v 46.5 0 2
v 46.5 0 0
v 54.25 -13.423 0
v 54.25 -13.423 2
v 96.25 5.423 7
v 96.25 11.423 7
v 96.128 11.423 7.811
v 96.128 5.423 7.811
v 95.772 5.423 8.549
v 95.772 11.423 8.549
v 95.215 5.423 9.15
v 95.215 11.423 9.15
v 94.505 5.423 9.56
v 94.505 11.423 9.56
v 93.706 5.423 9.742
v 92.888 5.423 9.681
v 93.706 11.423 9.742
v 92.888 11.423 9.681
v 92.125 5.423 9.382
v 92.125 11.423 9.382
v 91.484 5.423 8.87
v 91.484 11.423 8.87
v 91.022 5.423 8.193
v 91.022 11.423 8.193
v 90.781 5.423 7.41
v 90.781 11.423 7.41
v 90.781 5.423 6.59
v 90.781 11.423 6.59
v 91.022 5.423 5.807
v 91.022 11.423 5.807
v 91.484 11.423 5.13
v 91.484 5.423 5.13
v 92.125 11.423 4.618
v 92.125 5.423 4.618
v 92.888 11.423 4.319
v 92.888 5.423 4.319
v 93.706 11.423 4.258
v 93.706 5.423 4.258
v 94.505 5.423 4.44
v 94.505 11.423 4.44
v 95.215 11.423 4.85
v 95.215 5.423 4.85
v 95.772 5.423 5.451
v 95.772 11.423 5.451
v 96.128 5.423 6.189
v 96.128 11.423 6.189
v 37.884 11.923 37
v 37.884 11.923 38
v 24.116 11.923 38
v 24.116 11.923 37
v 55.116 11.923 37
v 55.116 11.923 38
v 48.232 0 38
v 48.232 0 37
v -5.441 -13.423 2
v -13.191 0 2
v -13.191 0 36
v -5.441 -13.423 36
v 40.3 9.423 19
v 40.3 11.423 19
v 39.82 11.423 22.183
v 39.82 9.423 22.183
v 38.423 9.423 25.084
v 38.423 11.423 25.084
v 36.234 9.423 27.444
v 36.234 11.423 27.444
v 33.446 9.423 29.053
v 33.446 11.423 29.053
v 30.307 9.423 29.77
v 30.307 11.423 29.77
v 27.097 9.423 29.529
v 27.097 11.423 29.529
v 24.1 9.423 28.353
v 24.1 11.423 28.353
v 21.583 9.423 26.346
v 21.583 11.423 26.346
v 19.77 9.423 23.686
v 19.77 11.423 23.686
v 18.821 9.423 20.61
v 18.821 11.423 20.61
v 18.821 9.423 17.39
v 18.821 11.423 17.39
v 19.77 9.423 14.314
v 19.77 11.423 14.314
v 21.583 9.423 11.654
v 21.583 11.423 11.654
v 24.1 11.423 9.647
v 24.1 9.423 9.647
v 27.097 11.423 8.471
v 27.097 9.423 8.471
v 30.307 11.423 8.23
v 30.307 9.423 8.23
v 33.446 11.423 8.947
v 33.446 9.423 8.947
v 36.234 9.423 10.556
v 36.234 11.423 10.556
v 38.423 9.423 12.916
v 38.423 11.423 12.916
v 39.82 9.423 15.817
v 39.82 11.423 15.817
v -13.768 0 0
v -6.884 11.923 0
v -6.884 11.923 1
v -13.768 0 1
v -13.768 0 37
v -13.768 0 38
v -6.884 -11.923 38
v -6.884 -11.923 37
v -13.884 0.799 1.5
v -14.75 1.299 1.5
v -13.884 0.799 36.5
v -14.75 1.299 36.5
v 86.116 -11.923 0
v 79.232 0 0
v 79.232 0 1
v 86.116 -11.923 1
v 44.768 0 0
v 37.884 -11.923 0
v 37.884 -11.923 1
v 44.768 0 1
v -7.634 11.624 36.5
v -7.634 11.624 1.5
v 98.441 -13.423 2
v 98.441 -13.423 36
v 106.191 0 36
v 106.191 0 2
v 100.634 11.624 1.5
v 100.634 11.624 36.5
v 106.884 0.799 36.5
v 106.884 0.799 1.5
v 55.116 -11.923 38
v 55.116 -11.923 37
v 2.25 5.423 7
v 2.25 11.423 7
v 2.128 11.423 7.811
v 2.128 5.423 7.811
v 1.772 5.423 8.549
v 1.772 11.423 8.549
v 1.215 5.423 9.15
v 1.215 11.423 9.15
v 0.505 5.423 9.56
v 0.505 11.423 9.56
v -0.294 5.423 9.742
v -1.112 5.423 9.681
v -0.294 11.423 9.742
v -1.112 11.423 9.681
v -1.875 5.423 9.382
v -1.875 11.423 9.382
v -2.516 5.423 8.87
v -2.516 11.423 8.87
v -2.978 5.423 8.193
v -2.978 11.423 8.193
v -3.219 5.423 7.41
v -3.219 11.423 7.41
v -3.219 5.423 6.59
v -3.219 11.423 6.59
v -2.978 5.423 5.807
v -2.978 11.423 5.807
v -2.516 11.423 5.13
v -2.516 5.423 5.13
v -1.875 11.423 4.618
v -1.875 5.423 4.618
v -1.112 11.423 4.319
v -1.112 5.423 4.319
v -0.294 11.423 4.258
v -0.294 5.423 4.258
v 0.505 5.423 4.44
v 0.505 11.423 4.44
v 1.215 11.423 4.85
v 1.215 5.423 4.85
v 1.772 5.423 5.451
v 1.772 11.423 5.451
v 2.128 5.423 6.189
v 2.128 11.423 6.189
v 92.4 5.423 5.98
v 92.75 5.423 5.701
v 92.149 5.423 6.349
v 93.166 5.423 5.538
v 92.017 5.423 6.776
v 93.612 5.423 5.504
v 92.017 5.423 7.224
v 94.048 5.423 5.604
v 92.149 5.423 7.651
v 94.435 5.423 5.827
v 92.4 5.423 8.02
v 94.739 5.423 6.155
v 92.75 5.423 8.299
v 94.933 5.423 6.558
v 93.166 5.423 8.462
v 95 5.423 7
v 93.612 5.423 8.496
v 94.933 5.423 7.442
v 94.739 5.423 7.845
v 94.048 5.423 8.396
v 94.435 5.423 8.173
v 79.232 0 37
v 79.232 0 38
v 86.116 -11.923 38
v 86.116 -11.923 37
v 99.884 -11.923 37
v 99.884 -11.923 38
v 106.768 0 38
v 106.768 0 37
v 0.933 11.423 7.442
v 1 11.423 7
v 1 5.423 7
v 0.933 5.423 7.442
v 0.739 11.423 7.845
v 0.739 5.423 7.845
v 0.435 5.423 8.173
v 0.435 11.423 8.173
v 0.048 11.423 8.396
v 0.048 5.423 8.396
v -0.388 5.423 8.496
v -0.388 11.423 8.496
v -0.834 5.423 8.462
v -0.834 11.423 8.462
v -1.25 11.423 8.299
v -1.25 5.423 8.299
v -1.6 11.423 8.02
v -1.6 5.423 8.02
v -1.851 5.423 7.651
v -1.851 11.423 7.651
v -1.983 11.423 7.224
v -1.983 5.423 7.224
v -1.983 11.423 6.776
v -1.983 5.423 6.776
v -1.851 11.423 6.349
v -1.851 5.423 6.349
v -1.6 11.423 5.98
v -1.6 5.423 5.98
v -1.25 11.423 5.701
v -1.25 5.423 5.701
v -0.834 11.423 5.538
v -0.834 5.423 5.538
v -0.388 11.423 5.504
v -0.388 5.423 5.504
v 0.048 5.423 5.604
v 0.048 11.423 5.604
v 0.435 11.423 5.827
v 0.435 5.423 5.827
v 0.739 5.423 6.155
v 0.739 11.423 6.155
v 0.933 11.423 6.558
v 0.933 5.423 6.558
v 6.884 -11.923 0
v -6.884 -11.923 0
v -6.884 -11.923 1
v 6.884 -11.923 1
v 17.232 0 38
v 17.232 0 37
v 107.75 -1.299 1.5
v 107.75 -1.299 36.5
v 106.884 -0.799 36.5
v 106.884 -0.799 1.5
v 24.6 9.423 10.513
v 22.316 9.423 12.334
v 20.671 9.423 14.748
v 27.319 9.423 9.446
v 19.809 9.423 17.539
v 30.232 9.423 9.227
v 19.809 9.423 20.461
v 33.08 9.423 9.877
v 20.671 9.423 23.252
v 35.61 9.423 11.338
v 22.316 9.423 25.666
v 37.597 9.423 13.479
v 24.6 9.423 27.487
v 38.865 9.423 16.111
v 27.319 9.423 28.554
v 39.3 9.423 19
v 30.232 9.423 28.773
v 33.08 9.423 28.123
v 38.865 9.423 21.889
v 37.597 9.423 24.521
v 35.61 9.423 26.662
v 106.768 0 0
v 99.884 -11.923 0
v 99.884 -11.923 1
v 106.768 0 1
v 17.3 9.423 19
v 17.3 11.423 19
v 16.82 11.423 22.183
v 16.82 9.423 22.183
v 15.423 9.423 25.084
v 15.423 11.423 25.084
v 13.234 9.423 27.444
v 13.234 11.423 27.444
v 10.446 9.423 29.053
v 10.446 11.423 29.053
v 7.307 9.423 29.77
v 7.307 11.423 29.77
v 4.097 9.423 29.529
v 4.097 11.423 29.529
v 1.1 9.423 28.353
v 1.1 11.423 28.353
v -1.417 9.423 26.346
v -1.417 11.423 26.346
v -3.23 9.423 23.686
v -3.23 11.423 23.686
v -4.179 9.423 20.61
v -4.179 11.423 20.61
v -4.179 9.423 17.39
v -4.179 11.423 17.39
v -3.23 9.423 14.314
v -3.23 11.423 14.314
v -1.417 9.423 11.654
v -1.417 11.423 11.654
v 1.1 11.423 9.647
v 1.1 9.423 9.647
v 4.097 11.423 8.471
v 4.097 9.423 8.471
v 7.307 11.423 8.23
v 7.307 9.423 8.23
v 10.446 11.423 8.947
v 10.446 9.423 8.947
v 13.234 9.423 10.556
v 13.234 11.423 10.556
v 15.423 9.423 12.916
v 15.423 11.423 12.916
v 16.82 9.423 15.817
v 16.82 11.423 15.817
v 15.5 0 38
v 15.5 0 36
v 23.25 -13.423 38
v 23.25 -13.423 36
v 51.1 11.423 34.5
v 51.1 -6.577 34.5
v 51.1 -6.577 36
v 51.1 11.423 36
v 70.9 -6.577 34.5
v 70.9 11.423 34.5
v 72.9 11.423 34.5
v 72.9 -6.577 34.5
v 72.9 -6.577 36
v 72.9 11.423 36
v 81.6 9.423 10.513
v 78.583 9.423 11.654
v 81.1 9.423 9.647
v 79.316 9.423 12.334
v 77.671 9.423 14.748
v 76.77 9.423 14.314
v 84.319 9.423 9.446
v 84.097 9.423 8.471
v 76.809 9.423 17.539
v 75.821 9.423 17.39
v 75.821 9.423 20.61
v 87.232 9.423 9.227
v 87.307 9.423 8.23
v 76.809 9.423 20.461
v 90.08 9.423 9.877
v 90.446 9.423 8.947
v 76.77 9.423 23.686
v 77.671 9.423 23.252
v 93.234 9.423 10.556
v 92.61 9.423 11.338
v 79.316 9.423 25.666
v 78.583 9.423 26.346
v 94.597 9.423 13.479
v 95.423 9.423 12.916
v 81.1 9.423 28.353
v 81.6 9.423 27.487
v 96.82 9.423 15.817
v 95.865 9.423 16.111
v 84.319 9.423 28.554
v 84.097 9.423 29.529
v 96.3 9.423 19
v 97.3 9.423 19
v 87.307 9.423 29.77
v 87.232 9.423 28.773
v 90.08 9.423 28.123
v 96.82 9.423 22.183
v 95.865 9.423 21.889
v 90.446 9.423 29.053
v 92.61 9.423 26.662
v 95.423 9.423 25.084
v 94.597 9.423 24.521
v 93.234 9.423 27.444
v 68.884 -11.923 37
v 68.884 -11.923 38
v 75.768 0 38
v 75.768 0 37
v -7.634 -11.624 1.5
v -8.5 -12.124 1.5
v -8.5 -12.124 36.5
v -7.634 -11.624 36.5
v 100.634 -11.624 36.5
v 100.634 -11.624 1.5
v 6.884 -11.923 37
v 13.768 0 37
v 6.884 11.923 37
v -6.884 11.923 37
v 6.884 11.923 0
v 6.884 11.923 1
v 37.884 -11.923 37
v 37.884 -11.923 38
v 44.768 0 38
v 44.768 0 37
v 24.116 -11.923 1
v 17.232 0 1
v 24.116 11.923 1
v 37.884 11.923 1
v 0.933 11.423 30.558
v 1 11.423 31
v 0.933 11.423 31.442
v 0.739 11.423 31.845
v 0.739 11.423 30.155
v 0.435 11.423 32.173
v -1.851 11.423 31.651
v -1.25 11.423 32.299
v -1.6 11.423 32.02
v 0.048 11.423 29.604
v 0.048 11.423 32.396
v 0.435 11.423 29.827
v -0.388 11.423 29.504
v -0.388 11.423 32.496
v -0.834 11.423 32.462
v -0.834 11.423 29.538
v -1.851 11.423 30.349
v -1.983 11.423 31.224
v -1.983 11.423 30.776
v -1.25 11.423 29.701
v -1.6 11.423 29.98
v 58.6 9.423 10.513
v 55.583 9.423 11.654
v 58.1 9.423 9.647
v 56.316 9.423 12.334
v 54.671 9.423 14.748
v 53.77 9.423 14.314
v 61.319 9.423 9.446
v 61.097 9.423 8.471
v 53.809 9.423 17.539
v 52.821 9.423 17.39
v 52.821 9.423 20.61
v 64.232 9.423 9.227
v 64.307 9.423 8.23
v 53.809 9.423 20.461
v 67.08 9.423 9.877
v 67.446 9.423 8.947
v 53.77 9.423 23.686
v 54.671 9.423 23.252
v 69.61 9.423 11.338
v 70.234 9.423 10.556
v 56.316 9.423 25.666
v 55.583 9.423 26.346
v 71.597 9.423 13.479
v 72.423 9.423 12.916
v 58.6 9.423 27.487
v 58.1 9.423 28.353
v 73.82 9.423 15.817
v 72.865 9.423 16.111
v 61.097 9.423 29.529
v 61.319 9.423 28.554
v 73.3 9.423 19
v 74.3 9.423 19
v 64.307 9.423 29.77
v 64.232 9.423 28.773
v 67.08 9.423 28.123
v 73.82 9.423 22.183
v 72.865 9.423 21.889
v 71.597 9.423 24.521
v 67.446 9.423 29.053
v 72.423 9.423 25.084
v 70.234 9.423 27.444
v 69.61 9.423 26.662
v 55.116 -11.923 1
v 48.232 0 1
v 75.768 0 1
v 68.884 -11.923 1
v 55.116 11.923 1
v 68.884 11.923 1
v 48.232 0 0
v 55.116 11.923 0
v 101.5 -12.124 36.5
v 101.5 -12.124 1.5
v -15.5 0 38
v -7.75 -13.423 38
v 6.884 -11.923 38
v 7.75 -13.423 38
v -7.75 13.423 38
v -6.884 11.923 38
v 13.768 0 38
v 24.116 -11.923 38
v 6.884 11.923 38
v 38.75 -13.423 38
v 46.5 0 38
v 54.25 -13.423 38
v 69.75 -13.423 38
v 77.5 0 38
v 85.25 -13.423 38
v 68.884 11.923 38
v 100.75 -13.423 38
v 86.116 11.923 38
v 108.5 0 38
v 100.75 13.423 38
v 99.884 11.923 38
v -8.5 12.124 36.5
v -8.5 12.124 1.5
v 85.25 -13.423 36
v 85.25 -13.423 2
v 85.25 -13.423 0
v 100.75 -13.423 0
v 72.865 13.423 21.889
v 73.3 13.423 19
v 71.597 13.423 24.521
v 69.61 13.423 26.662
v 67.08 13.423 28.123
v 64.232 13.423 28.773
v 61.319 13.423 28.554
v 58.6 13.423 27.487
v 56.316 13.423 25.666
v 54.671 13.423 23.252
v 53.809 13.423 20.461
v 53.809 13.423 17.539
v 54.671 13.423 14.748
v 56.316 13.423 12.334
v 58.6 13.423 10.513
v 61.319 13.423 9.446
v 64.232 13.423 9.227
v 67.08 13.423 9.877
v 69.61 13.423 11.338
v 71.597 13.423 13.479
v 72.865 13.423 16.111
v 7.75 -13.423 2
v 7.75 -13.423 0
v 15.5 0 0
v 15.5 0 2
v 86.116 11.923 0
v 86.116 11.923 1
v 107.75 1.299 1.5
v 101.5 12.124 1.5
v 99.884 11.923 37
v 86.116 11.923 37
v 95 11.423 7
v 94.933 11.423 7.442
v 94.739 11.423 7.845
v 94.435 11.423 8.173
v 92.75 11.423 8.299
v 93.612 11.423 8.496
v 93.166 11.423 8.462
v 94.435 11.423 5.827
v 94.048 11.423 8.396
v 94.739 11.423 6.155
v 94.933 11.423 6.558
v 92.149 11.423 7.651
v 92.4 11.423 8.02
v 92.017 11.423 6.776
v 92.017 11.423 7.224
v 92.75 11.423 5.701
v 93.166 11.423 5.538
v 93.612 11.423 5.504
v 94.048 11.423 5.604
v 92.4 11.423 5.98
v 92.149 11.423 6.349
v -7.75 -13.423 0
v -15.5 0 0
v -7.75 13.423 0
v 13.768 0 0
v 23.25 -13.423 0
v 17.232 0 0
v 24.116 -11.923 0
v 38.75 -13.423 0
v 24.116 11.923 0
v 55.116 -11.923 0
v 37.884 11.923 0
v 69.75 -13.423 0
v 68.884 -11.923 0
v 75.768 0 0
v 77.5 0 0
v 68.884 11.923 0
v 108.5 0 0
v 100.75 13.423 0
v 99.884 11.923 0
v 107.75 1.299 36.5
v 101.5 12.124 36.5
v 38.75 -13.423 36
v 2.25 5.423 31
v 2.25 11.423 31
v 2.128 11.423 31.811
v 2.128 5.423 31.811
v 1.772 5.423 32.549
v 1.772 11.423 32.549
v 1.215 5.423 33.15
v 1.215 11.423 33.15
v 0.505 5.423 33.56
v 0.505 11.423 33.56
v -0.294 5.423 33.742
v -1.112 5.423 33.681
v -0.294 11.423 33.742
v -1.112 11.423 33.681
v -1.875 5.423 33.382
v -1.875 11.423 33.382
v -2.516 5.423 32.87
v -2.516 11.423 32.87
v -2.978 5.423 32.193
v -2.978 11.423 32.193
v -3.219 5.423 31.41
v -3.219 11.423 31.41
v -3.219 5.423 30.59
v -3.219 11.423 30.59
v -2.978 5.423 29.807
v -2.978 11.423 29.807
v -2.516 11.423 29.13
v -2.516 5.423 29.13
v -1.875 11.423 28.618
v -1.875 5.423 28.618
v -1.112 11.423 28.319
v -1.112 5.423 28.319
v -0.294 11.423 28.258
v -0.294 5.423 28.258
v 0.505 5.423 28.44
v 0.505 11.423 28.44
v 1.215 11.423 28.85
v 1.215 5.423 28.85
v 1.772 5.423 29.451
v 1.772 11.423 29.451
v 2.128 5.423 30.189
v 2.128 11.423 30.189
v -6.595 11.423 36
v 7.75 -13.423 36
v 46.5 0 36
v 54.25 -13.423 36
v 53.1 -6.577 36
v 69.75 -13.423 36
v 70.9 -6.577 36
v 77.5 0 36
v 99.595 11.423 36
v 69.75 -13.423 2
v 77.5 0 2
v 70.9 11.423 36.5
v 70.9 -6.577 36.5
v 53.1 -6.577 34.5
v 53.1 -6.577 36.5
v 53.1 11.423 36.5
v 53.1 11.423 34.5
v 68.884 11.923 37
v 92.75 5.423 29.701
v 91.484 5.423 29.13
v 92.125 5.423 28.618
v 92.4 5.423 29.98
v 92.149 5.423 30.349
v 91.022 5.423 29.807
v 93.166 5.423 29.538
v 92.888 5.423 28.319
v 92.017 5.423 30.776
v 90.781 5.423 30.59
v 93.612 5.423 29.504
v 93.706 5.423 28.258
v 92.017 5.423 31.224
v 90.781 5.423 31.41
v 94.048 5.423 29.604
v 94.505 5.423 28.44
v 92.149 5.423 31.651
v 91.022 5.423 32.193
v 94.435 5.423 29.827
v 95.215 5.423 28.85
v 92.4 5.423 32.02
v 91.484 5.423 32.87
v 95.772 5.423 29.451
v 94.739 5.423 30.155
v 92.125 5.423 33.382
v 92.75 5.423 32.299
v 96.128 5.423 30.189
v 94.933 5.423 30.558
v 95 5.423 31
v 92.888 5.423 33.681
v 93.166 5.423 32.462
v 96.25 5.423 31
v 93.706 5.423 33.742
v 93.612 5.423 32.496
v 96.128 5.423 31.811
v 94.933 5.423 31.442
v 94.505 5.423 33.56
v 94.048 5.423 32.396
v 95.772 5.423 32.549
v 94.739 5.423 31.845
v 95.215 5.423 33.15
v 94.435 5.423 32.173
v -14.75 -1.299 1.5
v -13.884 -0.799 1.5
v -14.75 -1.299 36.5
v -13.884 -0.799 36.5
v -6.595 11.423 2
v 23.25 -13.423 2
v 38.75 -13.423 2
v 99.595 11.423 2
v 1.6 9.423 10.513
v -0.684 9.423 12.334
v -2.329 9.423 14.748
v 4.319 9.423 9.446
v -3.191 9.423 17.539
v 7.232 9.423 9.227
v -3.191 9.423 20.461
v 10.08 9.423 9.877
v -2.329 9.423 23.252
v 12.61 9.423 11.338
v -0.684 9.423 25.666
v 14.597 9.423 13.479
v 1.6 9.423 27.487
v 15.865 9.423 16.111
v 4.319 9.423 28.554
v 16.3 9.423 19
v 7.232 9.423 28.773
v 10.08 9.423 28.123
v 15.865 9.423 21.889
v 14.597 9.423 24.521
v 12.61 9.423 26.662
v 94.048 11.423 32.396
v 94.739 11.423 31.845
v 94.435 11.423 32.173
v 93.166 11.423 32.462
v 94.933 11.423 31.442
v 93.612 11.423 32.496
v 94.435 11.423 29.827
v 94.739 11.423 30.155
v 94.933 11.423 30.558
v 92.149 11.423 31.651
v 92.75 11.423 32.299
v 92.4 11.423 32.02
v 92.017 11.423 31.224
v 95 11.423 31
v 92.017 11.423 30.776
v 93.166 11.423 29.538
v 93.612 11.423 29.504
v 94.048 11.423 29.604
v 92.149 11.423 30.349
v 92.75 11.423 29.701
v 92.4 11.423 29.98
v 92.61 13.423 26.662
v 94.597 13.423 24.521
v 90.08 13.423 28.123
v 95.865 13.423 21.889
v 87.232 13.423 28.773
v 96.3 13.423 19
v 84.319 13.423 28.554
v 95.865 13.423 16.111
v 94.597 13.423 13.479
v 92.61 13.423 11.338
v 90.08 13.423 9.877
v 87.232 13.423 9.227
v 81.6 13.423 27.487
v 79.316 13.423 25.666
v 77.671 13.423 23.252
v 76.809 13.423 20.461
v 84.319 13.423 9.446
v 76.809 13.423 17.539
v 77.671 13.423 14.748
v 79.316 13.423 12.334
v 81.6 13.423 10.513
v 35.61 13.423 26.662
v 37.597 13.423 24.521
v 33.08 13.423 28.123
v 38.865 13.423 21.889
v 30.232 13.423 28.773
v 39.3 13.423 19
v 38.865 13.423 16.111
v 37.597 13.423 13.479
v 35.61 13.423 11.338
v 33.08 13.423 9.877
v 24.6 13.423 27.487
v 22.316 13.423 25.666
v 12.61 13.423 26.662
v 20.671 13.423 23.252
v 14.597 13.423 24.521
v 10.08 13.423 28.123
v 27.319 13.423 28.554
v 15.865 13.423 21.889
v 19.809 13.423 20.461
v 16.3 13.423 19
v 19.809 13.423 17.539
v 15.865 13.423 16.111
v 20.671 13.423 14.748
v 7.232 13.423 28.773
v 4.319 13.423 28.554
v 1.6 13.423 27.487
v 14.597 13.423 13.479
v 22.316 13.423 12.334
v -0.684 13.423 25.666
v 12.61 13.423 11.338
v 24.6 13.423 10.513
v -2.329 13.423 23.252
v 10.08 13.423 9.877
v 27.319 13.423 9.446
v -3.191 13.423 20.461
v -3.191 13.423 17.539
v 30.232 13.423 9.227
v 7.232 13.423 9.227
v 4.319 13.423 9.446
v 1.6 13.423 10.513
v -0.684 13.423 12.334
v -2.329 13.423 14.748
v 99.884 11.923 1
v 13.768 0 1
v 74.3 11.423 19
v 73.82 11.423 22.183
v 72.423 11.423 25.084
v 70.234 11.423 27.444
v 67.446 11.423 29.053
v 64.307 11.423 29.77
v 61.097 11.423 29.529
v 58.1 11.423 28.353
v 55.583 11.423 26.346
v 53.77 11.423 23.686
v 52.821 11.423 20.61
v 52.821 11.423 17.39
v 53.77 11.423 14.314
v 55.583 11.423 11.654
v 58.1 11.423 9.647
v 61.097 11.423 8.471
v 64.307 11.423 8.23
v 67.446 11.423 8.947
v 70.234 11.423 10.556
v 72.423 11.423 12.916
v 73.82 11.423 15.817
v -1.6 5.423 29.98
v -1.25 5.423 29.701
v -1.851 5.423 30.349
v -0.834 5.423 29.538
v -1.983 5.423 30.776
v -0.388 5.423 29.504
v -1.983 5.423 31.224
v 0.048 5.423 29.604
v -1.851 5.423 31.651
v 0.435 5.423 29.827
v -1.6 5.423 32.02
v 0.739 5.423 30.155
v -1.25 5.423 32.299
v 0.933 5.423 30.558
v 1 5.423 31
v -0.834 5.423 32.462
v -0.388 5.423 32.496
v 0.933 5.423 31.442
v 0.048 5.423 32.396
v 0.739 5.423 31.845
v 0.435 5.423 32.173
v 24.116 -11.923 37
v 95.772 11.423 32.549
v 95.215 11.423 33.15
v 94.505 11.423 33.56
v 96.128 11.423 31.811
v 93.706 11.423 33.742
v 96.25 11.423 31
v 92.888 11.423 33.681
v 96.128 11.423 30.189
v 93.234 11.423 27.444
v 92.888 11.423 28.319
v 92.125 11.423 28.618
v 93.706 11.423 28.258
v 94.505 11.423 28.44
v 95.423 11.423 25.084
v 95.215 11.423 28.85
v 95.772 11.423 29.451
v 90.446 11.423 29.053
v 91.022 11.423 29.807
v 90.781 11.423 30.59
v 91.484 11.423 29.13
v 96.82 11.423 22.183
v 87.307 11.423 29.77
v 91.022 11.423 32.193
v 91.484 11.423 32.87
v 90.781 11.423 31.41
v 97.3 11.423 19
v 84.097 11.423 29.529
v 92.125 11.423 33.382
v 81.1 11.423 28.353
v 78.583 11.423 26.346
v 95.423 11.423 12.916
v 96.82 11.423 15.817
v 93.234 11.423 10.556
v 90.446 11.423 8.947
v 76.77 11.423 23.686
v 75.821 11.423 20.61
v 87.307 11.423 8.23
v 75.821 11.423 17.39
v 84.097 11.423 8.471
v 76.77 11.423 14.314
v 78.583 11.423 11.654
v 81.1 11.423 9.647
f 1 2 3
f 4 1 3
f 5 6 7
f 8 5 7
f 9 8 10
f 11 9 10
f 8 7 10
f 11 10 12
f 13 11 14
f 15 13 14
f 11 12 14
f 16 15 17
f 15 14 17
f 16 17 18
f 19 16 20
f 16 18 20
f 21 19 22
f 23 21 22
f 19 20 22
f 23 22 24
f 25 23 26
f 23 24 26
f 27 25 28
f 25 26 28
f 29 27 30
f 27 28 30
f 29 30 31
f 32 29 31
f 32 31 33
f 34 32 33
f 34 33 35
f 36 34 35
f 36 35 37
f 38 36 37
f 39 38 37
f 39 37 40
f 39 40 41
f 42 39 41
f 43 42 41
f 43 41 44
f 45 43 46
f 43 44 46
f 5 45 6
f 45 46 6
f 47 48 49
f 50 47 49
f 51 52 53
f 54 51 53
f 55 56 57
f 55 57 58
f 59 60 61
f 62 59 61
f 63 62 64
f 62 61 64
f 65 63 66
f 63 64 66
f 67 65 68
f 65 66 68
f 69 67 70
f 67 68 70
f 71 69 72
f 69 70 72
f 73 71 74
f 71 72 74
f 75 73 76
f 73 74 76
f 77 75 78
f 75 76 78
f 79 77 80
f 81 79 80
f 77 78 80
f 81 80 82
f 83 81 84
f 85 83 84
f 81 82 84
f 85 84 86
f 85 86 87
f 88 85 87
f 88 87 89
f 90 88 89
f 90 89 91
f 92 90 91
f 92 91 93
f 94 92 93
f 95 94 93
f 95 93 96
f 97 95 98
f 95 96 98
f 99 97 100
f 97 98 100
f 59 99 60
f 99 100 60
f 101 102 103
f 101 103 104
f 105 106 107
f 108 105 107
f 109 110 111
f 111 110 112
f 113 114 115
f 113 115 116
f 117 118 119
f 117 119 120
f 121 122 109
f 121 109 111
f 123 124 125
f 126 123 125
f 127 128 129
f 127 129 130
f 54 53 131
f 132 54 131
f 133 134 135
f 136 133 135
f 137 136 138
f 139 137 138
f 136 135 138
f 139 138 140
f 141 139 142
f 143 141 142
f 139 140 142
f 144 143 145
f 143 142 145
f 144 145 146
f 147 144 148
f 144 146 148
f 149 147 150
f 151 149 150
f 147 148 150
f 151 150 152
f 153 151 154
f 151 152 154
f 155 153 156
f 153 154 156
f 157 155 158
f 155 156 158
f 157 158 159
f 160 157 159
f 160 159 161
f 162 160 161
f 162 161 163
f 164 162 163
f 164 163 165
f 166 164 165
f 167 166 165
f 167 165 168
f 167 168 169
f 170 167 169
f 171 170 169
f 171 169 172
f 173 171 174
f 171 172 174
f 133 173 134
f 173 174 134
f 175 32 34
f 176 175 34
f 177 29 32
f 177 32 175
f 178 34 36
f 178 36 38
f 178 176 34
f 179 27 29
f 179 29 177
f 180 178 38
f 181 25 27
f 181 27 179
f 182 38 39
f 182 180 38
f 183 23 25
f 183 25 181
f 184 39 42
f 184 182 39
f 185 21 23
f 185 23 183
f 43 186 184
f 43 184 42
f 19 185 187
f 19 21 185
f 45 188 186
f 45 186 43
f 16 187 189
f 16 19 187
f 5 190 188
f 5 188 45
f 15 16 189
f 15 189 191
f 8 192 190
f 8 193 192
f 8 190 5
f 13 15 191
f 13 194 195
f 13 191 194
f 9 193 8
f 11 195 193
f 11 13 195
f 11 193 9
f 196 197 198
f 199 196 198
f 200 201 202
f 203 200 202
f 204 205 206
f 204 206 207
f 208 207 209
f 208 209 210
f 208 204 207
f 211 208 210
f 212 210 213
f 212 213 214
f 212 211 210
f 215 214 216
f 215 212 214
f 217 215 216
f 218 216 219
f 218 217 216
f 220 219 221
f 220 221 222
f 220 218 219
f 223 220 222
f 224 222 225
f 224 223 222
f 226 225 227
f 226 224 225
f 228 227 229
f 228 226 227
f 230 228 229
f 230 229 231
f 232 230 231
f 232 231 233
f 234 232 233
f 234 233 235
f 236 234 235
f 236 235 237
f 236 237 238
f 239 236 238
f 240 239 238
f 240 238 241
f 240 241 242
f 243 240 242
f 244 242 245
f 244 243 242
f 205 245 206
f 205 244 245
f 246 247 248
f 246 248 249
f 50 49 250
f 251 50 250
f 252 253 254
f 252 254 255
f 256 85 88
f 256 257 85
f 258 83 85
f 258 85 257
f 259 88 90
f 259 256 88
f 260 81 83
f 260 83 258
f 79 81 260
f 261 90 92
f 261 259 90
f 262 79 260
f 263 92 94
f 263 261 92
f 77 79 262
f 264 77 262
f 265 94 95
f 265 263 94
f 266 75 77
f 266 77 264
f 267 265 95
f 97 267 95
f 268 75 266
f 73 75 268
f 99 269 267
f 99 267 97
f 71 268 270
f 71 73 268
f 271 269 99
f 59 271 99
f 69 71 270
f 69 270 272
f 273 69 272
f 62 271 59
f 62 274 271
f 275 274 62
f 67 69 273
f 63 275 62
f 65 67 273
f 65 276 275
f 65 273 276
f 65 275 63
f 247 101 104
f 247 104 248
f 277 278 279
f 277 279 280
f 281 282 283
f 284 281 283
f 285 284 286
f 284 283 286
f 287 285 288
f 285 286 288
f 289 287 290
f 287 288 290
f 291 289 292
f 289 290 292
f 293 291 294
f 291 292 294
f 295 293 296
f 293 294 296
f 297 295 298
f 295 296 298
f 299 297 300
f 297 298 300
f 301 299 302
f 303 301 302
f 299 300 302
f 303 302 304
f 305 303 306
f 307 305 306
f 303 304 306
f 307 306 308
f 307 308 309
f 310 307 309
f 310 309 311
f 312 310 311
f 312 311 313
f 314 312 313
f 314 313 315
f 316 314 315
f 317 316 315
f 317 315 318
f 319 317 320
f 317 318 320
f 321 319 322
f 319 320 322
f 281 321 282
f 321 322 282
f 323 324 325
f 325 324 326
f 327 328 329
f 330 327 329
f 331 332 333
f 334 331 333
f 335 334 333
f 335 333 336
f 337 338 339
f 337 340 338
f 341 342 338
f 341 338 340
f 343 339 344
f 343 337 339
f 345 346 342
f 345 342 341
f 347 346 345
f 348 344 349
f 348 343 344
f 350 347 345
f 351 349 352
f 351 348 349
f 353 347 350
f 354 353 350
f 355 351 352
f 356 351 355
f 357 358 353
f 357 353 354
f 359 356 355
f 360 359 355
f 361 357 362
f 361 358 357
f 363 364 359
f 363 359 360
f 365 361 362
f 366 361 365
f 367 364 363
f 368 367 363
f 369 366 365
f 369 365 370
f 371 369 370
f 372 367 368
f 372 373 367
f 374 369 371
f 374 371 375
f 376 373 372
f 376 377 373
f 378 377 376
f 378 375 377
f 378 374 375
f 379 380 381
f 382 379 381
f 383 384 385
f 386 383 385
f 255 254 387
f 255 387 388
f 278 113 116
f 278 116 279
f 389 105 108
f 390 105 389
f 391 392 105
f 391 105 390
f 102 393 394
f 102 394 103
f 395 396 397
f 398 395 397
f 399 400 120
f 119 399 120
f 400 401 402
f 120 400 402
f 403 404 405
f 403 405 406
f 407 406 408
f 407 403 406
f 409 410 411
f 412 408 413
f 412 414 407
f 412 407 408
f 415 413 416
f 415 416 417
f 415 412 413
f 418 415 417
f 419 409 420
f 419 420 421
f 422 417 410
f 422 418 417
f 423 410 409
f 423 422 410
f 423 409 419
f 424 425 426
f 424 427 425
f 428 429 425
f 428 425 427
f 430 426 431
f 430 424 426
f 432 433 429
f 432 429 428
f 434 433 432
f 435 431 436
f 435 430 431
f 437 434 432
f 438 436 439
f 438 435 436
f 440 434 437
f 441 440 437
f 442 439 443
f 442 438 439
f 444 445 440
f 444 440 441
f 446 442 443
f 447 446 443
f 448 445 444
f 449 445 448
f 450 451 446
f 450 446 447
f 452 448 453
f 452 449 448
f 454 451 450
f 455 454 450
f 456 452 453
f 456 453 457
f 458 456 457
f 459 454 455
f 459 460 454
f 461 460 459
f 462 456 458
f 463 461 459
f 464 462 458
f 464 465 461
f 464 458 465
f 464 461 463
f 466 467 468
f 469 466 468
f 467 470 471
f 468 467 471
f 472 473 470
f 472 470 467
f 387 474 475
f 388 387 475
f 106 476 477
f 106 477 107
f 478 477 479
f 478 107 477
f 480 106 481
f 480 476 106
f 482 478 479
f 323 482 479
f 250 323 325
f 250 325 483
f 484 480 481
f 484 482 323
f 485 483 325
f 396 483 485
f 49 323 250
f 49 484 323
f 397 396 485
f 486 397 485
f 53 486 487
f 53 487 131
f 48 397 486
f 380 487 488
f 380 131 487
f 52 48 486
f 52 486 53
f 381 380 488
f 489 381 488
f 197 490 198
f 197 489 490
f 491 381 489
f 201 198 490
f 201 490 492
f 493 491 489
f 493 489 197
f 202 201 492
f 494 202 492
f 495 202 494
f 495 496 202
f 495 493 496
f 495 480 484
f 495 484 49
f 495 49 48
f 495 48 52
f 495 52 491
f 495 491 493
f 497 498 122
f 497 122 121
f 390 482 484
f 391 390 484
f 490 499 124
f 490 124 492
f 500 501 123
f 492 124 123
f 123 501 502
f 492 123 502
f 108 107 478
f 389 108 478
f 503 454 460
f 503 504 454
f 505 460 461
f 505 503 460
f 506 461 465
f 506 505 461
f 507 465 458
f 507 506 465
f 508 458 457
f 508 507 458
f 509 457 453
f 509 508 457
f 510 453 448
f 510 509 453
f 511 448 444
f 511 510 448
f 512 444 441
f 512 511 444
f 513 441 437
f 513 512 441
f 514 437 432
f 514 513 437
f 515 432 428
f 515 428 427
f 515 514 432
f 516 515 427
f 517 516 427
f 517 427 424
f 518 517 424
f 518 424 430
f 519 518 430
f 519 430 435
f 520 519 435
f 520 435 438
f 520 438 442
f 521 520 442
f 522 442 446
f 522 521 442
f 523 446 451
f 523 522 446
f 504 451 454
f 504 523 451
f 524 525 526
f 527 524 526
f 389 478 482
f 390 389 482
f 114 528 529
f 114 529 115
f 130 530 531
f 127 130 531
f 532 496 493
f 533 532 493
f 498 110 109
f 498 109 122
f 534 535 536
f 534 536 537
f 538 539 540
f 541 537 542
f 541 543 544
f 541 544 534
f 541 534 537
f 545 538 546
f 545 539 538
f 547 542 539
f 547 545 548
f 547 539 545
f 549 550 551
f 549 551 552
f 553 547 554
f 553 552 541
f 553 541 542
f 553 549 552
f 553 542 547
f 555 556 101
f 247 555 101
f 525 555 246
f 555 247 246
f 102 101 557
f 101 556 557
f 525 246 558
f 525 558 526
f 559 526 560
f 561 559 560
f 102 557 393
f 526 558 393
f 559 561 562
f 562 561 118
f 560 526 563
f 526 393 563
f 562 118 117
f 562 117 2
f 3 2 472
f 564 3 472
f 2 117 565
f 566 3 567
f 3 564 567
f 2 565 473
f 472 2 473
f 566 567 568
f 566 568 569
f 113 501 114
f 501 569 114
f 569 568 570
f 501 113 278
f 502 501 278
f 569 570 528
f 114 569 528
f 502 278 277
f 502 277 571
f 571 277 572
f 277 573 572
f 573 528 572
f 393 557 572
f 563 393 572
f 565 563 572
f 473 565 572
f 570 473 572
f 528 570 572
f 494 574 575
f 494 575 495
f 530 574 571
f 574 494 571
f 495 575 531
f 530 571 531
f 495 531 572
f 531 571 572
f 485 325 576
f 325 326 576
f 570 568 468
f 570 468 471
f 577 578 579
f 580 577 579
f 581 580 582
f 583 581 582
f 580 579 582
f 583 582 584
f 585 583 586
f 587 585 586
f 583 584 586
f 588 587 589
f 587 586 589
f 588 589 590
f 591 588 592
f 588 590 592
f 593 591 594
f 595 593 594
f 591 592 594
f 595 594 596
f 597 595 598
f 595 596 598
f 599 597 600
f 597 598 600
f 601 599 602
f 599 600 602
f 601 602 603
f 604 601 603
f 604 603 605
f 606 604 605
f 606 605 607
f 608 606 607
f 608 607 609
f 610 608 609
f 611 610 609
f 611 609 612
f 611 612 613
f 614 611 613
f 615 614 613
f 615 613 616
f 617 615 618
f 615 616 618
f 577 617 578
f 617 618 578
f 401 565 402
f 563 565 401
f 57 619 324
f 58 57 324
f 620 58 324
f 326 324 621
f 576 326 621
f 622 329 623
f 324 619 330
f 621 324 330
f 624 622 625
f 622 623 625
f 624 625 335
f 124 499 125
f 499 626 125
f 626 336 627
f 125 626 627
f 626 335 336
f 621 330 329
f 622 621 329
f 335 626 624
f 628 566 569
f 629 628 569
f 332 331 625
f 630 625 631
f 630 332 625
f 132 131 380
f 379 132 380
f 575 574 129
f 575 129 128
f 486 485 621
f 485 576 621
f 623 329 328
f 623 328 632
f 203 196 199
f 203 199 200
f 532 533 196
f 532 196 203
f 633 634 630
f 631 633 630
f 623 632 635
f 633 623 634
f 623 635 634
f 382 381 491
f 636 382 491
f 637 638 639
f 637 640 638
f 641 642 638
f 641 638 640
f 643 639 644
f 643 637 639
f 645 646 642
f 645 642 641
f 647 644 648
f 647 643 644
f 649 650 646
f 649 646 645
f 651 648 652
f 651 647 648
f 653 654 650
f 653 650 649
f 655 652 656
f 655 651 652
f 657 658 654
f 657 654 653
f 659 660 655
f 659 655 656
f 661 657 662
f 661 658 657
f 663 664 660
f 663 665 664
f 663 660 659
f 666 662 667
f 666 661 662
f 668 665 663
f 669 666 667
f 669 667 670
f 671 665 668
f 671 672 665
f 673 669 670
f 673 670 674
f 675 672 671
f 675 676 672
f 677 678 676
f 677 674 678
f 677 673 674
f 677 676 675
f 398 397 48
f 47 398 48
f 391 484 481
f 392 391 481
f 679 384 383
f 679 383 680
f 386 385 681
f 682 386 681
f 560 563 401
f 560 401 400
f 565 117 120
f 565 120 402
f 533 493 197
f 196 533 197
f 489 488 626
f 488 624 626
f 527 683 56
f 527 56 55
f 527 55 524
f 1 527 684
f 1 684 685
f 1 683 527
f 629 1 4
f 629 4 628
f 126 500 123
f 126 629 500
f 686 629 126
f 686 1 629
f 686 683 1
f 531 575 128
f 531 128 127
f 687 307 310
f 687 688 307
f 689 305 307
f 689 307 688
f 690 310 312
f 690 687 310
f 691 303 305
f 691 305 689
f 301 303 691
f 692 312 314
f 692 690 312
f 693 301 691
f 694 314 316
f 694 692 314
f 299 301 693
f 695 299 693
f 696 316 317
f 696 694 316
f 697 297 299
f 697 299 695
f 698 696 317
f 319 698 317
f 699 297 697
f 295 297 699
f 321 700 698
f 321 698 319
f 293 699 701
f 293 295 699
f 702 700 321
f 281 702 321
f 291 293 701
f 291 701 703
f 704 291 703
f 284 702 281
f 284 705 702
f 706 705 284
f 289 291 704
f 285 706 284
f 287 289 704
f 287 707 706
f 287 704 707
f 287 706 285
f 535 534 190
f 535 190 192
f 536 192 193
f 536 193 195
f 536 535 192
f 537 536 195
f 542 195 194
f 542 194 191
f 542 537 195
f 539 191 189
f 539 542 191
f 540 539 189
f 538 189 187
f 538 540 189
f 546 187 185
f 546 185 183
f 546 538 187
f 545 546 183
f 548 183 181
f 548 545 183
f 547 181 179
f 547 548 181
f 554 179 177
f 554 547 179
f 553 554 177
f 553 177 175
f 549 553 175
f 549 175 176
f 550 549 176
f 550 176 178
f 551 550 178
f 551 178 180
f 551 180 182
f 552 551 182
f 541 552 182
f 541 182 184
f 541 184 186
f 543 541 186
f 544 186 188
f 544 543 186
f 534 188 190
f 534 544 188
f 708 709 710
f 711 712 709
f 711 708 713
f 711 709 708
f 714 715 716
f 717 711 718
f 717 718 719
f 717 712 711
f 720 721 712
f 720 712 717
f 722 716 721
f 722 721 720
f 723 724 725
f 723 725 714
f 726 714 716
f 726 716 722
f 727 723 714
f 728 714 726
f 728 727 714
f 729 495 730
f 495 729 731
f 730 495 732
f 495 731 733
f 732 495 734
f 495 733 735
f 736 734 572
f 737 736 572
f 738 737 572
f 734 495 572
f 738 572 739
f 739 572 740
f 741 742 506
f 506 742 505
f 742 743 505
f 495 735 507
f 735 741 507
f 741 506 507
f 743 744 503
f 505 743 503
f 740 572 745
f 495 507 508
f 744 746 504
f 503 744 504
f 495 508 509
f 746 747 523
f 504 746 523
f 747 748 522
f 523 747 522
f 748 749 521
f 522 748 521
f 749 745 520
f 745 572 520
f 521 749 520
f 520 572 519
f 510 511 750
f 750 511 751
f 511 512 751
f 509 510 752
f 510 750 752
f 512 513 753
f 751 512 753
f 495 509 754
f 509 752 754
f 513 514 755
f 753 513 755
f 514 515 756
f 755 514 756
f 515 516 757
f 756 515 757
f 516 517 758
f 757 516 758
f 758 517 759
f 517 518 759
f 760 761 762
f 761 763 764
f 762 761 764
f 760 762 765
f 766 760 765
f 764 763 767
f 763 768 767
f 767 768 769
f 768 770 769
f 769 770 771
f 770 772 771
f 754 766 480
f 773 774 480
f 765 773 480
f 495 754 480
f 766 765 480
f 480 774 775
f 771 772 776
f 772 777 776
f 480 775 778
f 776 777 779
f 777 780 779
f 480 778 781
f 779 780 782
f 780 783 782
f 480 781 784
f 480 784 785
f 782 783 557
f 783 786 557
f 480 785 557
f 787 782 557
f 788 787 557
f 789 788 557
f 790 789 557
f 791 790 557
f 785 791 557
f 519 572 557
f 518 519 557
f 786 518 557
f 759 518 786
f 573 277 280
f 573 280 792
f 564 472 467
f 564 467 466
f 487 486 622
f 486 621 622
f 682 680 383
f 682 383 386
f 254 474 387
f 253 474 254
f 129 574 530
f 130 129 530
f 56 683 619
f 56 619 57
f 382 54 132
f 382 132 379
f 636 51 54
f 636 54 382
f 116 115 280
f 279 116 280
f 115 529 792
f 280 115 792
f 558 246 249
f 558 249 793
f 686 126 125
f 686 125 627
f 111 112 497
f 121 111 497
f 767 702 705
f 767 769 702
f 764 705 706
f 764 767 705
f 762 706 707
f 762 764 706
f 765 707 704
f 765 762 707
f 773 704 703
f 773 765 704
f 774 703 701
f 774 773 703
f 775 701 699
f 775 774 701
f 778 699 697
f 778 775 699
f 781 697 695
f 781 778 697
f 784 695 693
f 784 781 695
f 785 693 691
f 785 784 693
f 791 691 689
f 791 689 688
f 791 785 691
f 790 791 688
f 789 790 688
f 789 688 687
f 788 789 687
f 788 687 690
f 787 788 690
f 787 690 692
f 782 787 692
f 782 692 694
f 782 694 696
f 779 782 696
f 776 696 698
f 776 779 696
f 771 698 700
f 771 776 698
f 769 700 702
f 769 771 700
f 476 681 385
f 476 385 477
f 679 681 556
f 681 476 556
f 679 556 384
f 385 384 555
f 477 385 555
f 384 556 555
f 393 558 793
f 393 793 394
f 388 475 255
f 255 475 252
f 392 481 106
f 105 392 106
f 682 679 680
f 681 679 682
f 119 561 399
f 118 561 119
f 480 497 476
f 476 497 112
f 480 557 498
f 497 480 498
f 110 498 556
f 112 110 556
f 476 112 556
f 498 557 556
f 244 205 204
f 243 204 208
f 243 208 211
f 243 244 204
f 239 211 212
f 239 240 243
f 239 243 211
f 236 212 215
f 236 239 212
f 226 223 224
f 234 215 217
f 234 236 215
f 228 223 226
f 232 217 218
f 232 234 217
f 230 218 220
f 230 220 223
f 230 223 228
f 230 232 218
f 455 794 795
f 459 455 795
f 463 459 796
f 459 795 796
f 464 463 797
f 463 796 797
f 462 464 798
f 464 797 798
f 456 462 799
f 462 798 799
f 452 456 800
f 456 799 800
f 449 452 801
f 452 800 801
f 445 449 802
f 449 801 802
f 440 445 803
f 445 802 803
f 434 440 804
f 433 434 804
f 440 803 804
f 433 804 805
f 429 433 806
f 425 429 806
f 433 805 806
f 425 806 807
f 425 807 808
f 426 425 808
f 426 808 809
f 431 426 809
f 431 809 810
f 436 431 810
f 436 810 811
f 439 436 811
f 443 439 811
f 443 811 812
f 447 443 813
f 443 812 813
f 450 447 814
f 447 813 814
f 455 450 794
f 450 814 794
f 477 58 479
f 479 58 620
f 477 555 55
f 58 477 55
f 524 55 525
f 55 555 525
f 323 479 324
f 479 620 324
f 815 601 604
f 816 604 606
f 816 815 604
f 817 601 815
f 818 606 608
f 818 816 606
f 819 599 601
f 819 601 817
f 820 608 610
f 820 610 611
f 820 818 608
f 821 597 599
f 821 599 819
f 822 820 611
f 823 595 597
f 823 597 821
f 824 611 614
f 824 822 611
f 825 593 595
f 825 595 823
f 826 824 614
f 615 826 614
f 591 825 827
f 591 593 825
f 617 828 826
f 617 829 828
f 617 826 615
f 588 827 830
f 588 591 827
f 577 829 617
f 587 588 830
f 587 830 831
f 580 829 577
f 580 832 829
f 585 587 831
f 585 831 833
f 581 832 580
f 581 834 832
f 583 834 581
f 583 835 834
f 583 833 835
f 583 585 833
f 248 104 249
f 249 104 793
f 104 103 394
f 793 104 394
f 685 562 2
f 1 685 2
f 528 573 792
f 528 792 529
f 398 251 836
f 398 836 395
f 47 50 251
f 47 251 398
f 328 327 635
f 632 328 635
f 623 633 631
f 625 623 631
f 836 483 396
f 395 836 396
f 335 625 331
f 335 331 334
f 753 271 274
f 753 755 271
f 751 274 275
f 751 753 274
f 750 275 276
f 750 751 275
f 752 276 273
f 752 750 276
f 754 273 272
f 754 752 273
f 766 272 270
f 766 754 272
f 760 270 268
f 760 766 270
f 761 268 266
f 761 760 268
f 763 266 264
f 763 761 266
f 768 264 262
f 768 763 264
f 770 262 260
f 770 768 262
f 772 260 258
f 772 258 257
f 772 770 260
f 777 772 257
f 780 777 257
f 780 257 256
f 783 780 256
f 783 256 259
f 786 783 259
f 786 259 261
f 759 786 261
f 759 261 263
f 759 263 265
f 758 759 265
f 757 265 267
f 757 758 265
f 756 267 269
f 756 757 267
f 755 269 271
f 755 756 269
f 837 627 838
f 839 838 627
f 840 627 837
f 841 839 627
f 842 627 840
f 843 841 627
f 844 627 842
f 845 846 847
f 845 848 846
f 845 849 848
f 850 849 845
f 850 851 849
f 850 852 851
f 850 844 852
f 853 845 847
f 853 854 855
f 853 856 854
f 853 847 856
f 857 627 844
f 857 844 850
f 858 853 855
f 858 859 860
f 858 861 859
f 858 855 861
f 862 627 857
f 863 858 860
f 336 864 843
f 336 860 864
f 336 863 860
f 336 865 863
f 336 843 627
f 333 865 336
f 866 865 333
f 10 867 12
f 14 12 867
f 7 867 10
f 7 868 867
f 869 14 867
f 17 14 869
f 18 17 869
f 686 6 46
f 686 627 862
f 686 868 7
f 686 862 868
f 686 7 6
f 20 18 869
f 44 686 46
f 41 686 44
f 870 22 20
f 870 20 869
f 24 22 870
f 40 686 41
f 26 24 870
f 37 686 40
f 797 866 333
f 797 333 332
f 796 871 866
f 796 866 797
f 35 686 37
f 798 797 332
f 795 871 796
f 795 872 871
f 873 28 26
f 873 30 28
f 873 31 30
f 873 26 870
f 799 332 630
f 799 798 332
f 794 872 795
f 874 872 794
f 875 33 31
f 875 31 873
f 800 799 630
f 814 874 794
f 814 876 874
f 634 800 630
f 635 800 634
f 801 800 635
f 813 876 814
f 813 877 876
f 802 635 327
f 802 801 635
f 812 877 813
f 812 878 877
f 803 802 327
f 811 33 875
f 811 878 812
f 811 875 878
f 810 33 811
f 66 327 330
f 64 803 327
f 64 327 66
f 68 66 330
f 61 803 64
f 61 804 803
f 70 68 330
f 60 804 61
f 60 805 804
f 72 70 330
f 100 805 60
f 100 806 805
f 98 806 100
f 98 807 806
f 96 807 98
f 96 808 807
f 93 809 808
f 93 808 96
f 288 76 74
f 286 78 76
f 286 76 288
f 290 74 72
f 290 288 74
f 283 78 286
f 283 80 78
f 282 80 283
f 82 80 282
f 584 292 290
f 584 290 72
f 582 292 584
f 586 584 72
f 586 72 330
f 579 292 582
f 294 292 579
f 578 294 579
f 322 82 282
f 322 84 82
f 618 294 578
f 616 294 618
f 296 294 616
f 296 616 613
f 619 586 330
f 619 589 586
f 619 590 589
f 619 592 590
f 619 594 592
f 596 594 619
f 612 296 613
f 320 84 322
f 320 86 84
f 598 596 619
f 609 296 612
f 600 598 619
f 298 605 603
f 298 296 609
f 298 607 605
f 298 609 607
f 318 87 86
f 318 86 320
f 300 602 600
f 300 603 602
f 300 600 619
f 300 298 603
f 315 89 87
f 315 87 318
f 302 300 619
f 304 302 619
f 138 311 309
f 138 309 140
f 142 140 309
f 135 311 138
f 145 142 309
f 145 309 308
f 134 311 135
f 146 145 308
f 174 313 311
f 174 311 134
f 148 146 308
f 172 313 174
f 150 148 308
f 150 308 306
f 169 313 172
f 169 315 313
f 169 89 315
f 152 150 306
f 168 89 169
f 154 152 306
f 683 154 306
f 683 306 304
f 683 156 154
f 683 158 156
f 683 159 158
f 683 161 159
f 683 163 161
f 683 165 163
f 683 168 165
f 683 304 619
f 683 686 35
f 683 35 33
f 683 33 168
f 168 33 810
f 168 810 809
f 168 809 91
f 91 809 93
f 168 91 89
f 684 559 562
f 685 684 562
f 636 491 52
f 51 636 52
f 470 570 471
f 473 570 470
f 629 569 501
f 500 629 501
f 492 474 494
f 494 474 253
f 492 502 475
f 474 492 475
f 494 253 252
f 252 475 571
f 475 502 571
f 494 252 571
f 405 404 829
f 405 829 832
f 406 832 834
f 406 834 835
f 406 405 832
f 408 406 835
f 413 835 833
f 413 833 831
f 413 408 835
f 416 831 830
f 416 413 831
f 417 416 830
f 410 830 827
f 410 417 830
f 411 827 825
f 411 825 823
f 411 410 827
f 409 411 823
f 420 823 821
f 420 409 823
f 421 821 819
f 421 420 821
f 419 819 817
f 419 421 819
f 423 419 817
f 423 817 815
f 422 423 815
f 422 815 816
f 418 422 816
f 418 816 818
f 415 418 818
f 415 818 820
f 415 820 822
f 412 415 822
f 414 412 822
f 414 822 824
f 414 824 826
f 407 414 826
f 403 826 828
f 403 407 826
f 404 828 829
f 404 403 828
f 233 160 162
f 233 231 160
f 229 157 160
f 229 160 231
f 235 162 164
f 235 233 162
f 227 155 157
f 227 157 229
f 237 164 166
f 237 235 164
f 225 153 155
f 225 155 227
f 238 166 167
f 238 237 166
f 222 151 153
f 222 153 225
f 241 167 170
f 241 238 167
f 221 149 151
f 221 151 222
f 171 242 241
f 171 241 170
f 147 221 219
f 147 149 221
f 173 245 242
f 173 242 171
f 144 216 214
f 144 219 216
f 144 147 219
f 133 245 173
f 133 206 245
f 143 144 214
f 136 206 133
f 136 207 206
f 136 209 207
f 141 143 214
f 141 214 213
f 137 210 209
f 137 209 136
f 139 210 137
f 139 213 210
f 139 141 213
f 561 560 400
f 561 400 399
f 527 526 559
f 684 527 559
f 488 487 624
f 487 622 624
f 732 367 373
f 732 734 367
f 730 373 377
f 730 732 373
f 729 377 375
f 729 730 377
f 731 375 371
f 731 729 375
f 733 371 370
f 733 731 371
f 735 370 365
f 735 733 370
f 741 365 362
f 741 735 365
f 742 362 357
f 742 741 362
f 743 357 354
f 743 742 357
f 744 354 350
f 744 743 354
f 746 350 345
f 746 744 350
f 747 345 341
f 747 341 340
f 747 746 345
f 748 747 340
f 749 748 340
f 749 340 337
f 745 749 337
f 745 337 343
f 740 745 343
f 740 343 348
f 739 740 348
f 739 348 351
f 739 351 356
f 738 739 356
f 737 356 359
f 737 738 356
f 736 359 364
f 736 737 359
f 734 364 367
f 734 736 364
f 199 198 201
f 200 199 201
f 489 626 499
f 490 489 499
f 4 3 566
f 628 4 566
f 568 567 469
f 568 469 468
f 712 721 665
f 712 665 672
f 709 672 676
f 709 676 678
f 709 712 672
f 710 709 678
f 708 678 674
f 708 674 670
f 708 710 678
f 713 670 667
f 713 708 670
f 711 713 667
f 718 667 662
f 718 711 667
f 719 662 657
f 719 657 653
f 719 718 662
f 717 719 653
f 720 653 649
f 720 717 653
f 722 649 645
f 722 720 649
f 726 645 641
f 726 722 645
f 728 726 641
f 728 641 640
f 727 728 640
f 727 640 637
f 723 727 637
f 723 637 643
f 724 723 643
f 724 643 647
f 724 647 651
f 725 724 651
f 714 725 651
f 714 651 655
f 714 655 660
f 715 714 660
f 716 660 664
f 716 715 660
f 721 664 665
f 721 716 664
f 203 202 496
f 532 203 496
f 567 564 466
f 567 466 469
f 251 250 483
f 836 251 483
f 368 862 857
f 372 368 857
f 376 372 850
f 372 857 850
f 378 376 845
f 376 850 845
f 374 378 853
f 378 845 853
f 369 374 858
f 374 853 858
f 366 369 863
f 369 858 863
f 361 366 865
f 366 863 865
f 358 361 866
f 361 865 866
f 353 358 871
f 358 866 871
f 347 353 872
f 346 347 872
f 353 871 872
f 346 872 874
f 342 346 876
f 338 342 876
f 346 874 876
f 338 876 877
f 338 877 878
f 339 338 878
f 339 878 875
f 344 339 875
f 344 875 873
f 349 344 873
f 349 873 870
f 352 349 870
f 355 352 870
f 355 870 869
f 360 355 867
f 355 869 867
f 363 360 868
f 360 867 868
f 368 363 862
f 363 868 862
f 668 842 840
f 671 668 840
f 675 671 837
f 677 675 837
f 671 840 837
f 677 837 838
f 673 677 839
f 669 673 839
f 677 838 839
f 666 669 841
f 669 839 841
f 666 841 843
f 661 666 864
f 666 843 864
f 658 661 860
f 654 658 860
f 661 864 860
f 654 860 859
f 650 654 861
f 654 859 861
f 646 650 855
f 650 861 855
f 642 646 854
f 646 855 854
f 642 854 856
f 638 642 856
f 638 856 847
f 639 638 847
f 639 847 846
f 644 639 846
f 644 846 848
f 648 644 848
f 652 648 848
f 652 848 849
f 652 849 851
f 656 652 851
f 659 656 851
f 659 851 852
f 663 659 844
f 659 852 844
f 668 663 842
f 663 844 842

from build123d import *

# Parameters (mm, degrees)
BOSS_EXTRUDE1_DEPTH = 38
SHELL2_T            = -2
CUT_EXTRUDE2_DEPTH  = 1
CUT_EXTRUDE3_START  = -38
CUT_EXTRUDE3_DEPTH  = 1
SKETCH4_W           = 35
SKETCH4_H           = 12.5
CUT_EXTRUDE4_DEPTH  = 1
SKETCH5_W           = 35
SKETCH5_H           = 12.5
CUT_EXTRUDE5_DEPTH  = 1
SKETCH7_W           = 35
SKETCH7_H           = 12.5
CUT_EXTRUDE7_DEPTH  = 1
SKETCH8_W           = 35
SKETCH8_H           = 12.5
CUT_EXTRUDE8_DEPTH  = 1
SKETCH6_R           = 9.8
CUT_EXTRUDE6_DEPTH  = 10
SKETCH9_R           = 2.75
SKETCH9_R_2         = 1.5
BOSS_EXTRUDE2_DEPTH = 6
SKETCH11_W          = 2
SKETCH11_H          = 1.5
BOSS_EXTRUDE5_DEPTH = 18
SKETCH12_W          = 17.8
SKETCH12_H          = 2
CUT_EXTRUDE9_DEPTH  = 18
SKETCH14_R          = 10.8
SKETCH14_R_2        = 9.8
BOSS_EXTRUDE6_DEPTH = 2


with BuildPart() as part:
    # Sketch1 → Boss-Extrude1 (new body)
    with BuildSketch(Plane.XY):
        Polygon((-7.75, -13.423393759), (7.75, -13.423393759), (15.5, 0), (7.75, 13.423393759), (-7.75, 13.423393759), (-15.5, 0), align=None)
        Polygon((23.25, 13.423393759), (15.5, 0), (7.75, 13.423393759), align=None)
        Polygon((38.75, 13.423393759), (23.25, 13.423393759), (15.5, 0), (23.25, -13.423393759), (38.75, -13.423393759), (46.5, 0), align=None)
        Polygon((38.75, 13.423393759), (54.25, 13.423393759), (46.5, 0), align=None)
        Polygon((69.75, 13.423393759), (54.25, 13.423393759), (46.5, 0), (54.25, -13.423393759), (69.75, -13.423393759), (77.5, 0), align=None)
        Polygon((69.75, 13.423393759), (85.25, 13.423393759), (77.5, 0), align=None)
        Polygon((100.75, 13.423393759), (85.25, 13.423393759), (77.5, 0), (85.25, -13.423393759), (100.75, -13.423393759), (108.5, 0), align=None)
    extrude(amount=BOSS_EXTRUDE1_DEPTH)

    # Shell2
    shell2_openings = [part.faces().sort_by_distance(p)[0] for p in [
        (93, -13.423393759, 19),
        (81.375, -6.711696879, 19),
        (73.625, -6.711696879, 19),
        (62, -13.423393759, 19),
        (50.375, -6.711696879, 19),
        (42.625, -6.711696879, 19),
        (31, -13.423393759, 19),
        (19.375, -6.711696879, 19),
        (11.625, -6.711696879, 19),
        (0, -13.423393759, 19),
    ]]
    offset(amount=SHELL2_T, openings=shell2_openings, kind=Kind.INTERSECTION)

    # Sketch3 → Cut-Extrude2 (cut)
    with BuildSketch(Plane.XY.offset(38)):
        Polygon((13.767949192, 0), (6.883974596, 11.923393759), (-6.883974596, 11.923393759), (-13.767949192, 0), (-6.883974596, -11.923393759), (6.883974596, -11.923393759), align=None)
        Polygon((44.767949192, 0), (37.883974596, 11.923393759), (24.116025404, 11.923393759), (17.232050808, 0), (24.116025404, -11.923393759), (37.883974596, -11.923393759), align=None)
        Polygon((75.767949192, 0), (68.883974596, 11.923393759), (55.116025404, 11.923393759), (48.232050808, 0), (55.116025404, -11.923393759), (68.883974596, -11.923393759), align=None)
        Polygon((106.767949192, 0), (99.883974596, 11.923393759), (86.116025404, 11.923393759), (79.232050808, 0), (86.116025404, -11.923393759), (99.883974596, -11.923393759), align=None)
    extrude(amount=-CUT_EXTRUDE2_DEPTH, mode=Mode.SUBTRACT)

    # Sketch3<2> → Cut-Extrude3 (cut)
    with BuildSketch(Plane.XY.offset(38).offset(CUT_EXTRUDE3_START)):
        Polygon((13.767949192, 0), (6.883974596, 11.923393759), (-6.883974596, 11.923393759), (-13.767949192, 0), (-6.883974596, -11.923393759), (6.883974596, -11.923393759), align=None)
        Polygon((44.767949192, 0), (37.883974596, 11.923393759), (24.116025404, 11.923393759), (17.232050808, 0), (24.116025404, -11.923393759), (37.883974596, -11.923393759), align=None)
        Polygon((75.767949192, 0), (68.883974596, 11.923393759), (55.116025404, 11.923393759), (48.232050808, 0), (55.116025404, -11.923393759), (68.883974596, -11.923393759), align=None)
        Polygon((106.767949192, 0), (99.883974596, 11.923393759), (86.116025404, 11.923393759), (79.232050808, 0), (86.116025404, -11.923393759), (99.883974596, -11.923393759), align=None)
    extrude(amount=CUT_EXTRUDE3_DEPTH, mode=Mode.SUBTRACT)

    # Sketch4 → Cut-Extrude4 (cut)
    with BuildSketch(Plane(origin=(81.375, 46.981878155, 0), x_dir=(0, 0, -1), z_dir=(0.866025404, 0.5, 0))):
        with Locations((-19, -46.5)):
            Rectangle(SKETCH4_W, SKETCH4_H)
    extrude(amount=-CUT_EXTRUDE4_DEPTH, mode=Mode.SUBTRACT)

    # Sketch5 → Cut-Extrude5 (cut)
    with BuildSketch(Plane(origin=(-11.625, 6.711696879, 0), x_dir=(0, 0, 1), z_dir=(-0.866025404, 0.5, 0))):
        with Locations((19, 0)):
            Rectangle(SKETCH5_W, SKETCH5_H)
    extrude(amount=-CUT_EXTRUDE5_DEPTH, mode=Mode.SUBTRACT)

    # Sketch7 → Cut-Extrude7 (cut)
    with BuildSketch(Plane(origin=(-11.625, -6.711696879, 0), x_dir=(0, 0, 1), z_dir=(-0.866025404, -0.5, 0))):
        with Locations((19, 0)):
            Rectangle(SKETCH7_W, SKETCH7_H)
    extrude(amount=-CUT_EXTRUDE7_DEPTH, mode=Mode.SUBTRACT)

    # Sketch8 → Cut-Extrude8 (cut)
    with BuildSketch(Plane(origin=(81.375, -46.981878155, 0), x_dir=(0, 0, -1), z_dir=(0.866025404, -0.5, 0))):
        with Locations((-19, 46.5)):
            Rectangle(SKETCH8_W, SKETCH8_H)
    extrude(amount=-CUT_EXTRUDE8_DEPTH, mode=Mode.SUBTRACT)

    # Sketch6 → Cut-Extrude6 (cut)
    with BuildSketch(Plane(origin=(0, 13.423393759, 0), x_dir=(1, 0, 0), z_dir=(0, 1, 0))):
        with Locations((6.5, -19)):
            Circle(SKETCH6_R)
        with Locations((29.5, -19)):
            Circle(SKETCH6_R)
        with Locations((63.5, -19)):
            Circle(SKETCH6_R)
        with Locations((86.5, -19)):
            Circle(SKETCH6_R)
    extrude(amount=-CUT_EXTRUDE6_DEPTH, mode=Mode.SUBTRACT)

    # Sketch9 → Boss-Extrude2 (add)
    with BuildSketch(Plane.XZ.offset(-11.423393759)):
        with Locations((-0.5, 31)):
            Circle(SKETCH9_R)
        with Locations((-0.5, 31)):
            Circle(SKETCH9_R_2, mode=Mode.SUBTRACT)
        with Locations((-0.5, 7)):
            Circle(SKETCH9_R)
        with Locations((-0.5, 7)):
            Circle(SKETCH9_R_2, mode=Mode.SUBTRACT)
        with Locations((93.5, 31)):
            Circle(SKETCH9_R)
        with Locations((93.5, 31)):
            Circle(SKETCH9_R_2, mode=Mode.SUBTRACT)
        with Locations((93.5, 7)):
            Circle(SKETCH9_R)
        with Locations((93.5, 7)):
            Circle(SKETCH9_R_2, mode=Mode.SUBTRACT)
    extrude(amount=BOSS_EXTRUDE2_DEPTH)

    # Sketch11 → Boss-Extrude5 (add)
    with BuildSketch(Plane.XZ.offset(-11.423393759)):
        with Locations((52.1, 35.25)):
            Rectangle(SKETCH11_W, SKETCH11_H)
        with Locations((71.9, 35.25)):
            Rectangle(SKETCH11_W, SKETCH11_H)
    extrude(amount=BOSS_EXTRUDE5_DEPTH)

    # Sketch12 → Cut-Extrude9 (cut)
    with BuildSketch(Plane.XZ.offset(-11.423393759)):
        with Locations((62, 35.5)):
            Rectangle(SKETCH12_W, SKETCH12_H)
    extrude(amount=CUT_EXTRUDE9_DEPTH, mode=Mode.SUBTRACT)

    # Sketch14 → Boss-Extrude6 (add)
    with BuildSketch(Plane.XZ.offset(-11.423393759)):
        with Locations((6.5, 19)):
            Circle(SKETCH14_R)
        with Locations((6.5, 19)):
            Circle(SKETCH14_R_2, mode=Mode.SUBTRACT)
        with Locations((29.5, 19)):
            Circle(SKETCH14_R)
        with Locations((29.5, 19)):
            Circle(SKETCH14_R_2, mode=Mode.SUBTRACT)
        with Locations((63.5, 19)):
            Circle(SKETCH14_R)
        with Locations((63.5, 19)):
            Circle(SKETCH14_R_2, mode=Mode.SUBTRACT)
        with Locations((86.5, 19)):
            Circle(SKETCH14_R)
        with Locations((86.5, 19)):
            Circle(SKETCH14_R_2, mode=Mode.SUBTRACT)
    extrude(amount=BOSS_EXTRUDE6_DEPTH)


solid = part.part
